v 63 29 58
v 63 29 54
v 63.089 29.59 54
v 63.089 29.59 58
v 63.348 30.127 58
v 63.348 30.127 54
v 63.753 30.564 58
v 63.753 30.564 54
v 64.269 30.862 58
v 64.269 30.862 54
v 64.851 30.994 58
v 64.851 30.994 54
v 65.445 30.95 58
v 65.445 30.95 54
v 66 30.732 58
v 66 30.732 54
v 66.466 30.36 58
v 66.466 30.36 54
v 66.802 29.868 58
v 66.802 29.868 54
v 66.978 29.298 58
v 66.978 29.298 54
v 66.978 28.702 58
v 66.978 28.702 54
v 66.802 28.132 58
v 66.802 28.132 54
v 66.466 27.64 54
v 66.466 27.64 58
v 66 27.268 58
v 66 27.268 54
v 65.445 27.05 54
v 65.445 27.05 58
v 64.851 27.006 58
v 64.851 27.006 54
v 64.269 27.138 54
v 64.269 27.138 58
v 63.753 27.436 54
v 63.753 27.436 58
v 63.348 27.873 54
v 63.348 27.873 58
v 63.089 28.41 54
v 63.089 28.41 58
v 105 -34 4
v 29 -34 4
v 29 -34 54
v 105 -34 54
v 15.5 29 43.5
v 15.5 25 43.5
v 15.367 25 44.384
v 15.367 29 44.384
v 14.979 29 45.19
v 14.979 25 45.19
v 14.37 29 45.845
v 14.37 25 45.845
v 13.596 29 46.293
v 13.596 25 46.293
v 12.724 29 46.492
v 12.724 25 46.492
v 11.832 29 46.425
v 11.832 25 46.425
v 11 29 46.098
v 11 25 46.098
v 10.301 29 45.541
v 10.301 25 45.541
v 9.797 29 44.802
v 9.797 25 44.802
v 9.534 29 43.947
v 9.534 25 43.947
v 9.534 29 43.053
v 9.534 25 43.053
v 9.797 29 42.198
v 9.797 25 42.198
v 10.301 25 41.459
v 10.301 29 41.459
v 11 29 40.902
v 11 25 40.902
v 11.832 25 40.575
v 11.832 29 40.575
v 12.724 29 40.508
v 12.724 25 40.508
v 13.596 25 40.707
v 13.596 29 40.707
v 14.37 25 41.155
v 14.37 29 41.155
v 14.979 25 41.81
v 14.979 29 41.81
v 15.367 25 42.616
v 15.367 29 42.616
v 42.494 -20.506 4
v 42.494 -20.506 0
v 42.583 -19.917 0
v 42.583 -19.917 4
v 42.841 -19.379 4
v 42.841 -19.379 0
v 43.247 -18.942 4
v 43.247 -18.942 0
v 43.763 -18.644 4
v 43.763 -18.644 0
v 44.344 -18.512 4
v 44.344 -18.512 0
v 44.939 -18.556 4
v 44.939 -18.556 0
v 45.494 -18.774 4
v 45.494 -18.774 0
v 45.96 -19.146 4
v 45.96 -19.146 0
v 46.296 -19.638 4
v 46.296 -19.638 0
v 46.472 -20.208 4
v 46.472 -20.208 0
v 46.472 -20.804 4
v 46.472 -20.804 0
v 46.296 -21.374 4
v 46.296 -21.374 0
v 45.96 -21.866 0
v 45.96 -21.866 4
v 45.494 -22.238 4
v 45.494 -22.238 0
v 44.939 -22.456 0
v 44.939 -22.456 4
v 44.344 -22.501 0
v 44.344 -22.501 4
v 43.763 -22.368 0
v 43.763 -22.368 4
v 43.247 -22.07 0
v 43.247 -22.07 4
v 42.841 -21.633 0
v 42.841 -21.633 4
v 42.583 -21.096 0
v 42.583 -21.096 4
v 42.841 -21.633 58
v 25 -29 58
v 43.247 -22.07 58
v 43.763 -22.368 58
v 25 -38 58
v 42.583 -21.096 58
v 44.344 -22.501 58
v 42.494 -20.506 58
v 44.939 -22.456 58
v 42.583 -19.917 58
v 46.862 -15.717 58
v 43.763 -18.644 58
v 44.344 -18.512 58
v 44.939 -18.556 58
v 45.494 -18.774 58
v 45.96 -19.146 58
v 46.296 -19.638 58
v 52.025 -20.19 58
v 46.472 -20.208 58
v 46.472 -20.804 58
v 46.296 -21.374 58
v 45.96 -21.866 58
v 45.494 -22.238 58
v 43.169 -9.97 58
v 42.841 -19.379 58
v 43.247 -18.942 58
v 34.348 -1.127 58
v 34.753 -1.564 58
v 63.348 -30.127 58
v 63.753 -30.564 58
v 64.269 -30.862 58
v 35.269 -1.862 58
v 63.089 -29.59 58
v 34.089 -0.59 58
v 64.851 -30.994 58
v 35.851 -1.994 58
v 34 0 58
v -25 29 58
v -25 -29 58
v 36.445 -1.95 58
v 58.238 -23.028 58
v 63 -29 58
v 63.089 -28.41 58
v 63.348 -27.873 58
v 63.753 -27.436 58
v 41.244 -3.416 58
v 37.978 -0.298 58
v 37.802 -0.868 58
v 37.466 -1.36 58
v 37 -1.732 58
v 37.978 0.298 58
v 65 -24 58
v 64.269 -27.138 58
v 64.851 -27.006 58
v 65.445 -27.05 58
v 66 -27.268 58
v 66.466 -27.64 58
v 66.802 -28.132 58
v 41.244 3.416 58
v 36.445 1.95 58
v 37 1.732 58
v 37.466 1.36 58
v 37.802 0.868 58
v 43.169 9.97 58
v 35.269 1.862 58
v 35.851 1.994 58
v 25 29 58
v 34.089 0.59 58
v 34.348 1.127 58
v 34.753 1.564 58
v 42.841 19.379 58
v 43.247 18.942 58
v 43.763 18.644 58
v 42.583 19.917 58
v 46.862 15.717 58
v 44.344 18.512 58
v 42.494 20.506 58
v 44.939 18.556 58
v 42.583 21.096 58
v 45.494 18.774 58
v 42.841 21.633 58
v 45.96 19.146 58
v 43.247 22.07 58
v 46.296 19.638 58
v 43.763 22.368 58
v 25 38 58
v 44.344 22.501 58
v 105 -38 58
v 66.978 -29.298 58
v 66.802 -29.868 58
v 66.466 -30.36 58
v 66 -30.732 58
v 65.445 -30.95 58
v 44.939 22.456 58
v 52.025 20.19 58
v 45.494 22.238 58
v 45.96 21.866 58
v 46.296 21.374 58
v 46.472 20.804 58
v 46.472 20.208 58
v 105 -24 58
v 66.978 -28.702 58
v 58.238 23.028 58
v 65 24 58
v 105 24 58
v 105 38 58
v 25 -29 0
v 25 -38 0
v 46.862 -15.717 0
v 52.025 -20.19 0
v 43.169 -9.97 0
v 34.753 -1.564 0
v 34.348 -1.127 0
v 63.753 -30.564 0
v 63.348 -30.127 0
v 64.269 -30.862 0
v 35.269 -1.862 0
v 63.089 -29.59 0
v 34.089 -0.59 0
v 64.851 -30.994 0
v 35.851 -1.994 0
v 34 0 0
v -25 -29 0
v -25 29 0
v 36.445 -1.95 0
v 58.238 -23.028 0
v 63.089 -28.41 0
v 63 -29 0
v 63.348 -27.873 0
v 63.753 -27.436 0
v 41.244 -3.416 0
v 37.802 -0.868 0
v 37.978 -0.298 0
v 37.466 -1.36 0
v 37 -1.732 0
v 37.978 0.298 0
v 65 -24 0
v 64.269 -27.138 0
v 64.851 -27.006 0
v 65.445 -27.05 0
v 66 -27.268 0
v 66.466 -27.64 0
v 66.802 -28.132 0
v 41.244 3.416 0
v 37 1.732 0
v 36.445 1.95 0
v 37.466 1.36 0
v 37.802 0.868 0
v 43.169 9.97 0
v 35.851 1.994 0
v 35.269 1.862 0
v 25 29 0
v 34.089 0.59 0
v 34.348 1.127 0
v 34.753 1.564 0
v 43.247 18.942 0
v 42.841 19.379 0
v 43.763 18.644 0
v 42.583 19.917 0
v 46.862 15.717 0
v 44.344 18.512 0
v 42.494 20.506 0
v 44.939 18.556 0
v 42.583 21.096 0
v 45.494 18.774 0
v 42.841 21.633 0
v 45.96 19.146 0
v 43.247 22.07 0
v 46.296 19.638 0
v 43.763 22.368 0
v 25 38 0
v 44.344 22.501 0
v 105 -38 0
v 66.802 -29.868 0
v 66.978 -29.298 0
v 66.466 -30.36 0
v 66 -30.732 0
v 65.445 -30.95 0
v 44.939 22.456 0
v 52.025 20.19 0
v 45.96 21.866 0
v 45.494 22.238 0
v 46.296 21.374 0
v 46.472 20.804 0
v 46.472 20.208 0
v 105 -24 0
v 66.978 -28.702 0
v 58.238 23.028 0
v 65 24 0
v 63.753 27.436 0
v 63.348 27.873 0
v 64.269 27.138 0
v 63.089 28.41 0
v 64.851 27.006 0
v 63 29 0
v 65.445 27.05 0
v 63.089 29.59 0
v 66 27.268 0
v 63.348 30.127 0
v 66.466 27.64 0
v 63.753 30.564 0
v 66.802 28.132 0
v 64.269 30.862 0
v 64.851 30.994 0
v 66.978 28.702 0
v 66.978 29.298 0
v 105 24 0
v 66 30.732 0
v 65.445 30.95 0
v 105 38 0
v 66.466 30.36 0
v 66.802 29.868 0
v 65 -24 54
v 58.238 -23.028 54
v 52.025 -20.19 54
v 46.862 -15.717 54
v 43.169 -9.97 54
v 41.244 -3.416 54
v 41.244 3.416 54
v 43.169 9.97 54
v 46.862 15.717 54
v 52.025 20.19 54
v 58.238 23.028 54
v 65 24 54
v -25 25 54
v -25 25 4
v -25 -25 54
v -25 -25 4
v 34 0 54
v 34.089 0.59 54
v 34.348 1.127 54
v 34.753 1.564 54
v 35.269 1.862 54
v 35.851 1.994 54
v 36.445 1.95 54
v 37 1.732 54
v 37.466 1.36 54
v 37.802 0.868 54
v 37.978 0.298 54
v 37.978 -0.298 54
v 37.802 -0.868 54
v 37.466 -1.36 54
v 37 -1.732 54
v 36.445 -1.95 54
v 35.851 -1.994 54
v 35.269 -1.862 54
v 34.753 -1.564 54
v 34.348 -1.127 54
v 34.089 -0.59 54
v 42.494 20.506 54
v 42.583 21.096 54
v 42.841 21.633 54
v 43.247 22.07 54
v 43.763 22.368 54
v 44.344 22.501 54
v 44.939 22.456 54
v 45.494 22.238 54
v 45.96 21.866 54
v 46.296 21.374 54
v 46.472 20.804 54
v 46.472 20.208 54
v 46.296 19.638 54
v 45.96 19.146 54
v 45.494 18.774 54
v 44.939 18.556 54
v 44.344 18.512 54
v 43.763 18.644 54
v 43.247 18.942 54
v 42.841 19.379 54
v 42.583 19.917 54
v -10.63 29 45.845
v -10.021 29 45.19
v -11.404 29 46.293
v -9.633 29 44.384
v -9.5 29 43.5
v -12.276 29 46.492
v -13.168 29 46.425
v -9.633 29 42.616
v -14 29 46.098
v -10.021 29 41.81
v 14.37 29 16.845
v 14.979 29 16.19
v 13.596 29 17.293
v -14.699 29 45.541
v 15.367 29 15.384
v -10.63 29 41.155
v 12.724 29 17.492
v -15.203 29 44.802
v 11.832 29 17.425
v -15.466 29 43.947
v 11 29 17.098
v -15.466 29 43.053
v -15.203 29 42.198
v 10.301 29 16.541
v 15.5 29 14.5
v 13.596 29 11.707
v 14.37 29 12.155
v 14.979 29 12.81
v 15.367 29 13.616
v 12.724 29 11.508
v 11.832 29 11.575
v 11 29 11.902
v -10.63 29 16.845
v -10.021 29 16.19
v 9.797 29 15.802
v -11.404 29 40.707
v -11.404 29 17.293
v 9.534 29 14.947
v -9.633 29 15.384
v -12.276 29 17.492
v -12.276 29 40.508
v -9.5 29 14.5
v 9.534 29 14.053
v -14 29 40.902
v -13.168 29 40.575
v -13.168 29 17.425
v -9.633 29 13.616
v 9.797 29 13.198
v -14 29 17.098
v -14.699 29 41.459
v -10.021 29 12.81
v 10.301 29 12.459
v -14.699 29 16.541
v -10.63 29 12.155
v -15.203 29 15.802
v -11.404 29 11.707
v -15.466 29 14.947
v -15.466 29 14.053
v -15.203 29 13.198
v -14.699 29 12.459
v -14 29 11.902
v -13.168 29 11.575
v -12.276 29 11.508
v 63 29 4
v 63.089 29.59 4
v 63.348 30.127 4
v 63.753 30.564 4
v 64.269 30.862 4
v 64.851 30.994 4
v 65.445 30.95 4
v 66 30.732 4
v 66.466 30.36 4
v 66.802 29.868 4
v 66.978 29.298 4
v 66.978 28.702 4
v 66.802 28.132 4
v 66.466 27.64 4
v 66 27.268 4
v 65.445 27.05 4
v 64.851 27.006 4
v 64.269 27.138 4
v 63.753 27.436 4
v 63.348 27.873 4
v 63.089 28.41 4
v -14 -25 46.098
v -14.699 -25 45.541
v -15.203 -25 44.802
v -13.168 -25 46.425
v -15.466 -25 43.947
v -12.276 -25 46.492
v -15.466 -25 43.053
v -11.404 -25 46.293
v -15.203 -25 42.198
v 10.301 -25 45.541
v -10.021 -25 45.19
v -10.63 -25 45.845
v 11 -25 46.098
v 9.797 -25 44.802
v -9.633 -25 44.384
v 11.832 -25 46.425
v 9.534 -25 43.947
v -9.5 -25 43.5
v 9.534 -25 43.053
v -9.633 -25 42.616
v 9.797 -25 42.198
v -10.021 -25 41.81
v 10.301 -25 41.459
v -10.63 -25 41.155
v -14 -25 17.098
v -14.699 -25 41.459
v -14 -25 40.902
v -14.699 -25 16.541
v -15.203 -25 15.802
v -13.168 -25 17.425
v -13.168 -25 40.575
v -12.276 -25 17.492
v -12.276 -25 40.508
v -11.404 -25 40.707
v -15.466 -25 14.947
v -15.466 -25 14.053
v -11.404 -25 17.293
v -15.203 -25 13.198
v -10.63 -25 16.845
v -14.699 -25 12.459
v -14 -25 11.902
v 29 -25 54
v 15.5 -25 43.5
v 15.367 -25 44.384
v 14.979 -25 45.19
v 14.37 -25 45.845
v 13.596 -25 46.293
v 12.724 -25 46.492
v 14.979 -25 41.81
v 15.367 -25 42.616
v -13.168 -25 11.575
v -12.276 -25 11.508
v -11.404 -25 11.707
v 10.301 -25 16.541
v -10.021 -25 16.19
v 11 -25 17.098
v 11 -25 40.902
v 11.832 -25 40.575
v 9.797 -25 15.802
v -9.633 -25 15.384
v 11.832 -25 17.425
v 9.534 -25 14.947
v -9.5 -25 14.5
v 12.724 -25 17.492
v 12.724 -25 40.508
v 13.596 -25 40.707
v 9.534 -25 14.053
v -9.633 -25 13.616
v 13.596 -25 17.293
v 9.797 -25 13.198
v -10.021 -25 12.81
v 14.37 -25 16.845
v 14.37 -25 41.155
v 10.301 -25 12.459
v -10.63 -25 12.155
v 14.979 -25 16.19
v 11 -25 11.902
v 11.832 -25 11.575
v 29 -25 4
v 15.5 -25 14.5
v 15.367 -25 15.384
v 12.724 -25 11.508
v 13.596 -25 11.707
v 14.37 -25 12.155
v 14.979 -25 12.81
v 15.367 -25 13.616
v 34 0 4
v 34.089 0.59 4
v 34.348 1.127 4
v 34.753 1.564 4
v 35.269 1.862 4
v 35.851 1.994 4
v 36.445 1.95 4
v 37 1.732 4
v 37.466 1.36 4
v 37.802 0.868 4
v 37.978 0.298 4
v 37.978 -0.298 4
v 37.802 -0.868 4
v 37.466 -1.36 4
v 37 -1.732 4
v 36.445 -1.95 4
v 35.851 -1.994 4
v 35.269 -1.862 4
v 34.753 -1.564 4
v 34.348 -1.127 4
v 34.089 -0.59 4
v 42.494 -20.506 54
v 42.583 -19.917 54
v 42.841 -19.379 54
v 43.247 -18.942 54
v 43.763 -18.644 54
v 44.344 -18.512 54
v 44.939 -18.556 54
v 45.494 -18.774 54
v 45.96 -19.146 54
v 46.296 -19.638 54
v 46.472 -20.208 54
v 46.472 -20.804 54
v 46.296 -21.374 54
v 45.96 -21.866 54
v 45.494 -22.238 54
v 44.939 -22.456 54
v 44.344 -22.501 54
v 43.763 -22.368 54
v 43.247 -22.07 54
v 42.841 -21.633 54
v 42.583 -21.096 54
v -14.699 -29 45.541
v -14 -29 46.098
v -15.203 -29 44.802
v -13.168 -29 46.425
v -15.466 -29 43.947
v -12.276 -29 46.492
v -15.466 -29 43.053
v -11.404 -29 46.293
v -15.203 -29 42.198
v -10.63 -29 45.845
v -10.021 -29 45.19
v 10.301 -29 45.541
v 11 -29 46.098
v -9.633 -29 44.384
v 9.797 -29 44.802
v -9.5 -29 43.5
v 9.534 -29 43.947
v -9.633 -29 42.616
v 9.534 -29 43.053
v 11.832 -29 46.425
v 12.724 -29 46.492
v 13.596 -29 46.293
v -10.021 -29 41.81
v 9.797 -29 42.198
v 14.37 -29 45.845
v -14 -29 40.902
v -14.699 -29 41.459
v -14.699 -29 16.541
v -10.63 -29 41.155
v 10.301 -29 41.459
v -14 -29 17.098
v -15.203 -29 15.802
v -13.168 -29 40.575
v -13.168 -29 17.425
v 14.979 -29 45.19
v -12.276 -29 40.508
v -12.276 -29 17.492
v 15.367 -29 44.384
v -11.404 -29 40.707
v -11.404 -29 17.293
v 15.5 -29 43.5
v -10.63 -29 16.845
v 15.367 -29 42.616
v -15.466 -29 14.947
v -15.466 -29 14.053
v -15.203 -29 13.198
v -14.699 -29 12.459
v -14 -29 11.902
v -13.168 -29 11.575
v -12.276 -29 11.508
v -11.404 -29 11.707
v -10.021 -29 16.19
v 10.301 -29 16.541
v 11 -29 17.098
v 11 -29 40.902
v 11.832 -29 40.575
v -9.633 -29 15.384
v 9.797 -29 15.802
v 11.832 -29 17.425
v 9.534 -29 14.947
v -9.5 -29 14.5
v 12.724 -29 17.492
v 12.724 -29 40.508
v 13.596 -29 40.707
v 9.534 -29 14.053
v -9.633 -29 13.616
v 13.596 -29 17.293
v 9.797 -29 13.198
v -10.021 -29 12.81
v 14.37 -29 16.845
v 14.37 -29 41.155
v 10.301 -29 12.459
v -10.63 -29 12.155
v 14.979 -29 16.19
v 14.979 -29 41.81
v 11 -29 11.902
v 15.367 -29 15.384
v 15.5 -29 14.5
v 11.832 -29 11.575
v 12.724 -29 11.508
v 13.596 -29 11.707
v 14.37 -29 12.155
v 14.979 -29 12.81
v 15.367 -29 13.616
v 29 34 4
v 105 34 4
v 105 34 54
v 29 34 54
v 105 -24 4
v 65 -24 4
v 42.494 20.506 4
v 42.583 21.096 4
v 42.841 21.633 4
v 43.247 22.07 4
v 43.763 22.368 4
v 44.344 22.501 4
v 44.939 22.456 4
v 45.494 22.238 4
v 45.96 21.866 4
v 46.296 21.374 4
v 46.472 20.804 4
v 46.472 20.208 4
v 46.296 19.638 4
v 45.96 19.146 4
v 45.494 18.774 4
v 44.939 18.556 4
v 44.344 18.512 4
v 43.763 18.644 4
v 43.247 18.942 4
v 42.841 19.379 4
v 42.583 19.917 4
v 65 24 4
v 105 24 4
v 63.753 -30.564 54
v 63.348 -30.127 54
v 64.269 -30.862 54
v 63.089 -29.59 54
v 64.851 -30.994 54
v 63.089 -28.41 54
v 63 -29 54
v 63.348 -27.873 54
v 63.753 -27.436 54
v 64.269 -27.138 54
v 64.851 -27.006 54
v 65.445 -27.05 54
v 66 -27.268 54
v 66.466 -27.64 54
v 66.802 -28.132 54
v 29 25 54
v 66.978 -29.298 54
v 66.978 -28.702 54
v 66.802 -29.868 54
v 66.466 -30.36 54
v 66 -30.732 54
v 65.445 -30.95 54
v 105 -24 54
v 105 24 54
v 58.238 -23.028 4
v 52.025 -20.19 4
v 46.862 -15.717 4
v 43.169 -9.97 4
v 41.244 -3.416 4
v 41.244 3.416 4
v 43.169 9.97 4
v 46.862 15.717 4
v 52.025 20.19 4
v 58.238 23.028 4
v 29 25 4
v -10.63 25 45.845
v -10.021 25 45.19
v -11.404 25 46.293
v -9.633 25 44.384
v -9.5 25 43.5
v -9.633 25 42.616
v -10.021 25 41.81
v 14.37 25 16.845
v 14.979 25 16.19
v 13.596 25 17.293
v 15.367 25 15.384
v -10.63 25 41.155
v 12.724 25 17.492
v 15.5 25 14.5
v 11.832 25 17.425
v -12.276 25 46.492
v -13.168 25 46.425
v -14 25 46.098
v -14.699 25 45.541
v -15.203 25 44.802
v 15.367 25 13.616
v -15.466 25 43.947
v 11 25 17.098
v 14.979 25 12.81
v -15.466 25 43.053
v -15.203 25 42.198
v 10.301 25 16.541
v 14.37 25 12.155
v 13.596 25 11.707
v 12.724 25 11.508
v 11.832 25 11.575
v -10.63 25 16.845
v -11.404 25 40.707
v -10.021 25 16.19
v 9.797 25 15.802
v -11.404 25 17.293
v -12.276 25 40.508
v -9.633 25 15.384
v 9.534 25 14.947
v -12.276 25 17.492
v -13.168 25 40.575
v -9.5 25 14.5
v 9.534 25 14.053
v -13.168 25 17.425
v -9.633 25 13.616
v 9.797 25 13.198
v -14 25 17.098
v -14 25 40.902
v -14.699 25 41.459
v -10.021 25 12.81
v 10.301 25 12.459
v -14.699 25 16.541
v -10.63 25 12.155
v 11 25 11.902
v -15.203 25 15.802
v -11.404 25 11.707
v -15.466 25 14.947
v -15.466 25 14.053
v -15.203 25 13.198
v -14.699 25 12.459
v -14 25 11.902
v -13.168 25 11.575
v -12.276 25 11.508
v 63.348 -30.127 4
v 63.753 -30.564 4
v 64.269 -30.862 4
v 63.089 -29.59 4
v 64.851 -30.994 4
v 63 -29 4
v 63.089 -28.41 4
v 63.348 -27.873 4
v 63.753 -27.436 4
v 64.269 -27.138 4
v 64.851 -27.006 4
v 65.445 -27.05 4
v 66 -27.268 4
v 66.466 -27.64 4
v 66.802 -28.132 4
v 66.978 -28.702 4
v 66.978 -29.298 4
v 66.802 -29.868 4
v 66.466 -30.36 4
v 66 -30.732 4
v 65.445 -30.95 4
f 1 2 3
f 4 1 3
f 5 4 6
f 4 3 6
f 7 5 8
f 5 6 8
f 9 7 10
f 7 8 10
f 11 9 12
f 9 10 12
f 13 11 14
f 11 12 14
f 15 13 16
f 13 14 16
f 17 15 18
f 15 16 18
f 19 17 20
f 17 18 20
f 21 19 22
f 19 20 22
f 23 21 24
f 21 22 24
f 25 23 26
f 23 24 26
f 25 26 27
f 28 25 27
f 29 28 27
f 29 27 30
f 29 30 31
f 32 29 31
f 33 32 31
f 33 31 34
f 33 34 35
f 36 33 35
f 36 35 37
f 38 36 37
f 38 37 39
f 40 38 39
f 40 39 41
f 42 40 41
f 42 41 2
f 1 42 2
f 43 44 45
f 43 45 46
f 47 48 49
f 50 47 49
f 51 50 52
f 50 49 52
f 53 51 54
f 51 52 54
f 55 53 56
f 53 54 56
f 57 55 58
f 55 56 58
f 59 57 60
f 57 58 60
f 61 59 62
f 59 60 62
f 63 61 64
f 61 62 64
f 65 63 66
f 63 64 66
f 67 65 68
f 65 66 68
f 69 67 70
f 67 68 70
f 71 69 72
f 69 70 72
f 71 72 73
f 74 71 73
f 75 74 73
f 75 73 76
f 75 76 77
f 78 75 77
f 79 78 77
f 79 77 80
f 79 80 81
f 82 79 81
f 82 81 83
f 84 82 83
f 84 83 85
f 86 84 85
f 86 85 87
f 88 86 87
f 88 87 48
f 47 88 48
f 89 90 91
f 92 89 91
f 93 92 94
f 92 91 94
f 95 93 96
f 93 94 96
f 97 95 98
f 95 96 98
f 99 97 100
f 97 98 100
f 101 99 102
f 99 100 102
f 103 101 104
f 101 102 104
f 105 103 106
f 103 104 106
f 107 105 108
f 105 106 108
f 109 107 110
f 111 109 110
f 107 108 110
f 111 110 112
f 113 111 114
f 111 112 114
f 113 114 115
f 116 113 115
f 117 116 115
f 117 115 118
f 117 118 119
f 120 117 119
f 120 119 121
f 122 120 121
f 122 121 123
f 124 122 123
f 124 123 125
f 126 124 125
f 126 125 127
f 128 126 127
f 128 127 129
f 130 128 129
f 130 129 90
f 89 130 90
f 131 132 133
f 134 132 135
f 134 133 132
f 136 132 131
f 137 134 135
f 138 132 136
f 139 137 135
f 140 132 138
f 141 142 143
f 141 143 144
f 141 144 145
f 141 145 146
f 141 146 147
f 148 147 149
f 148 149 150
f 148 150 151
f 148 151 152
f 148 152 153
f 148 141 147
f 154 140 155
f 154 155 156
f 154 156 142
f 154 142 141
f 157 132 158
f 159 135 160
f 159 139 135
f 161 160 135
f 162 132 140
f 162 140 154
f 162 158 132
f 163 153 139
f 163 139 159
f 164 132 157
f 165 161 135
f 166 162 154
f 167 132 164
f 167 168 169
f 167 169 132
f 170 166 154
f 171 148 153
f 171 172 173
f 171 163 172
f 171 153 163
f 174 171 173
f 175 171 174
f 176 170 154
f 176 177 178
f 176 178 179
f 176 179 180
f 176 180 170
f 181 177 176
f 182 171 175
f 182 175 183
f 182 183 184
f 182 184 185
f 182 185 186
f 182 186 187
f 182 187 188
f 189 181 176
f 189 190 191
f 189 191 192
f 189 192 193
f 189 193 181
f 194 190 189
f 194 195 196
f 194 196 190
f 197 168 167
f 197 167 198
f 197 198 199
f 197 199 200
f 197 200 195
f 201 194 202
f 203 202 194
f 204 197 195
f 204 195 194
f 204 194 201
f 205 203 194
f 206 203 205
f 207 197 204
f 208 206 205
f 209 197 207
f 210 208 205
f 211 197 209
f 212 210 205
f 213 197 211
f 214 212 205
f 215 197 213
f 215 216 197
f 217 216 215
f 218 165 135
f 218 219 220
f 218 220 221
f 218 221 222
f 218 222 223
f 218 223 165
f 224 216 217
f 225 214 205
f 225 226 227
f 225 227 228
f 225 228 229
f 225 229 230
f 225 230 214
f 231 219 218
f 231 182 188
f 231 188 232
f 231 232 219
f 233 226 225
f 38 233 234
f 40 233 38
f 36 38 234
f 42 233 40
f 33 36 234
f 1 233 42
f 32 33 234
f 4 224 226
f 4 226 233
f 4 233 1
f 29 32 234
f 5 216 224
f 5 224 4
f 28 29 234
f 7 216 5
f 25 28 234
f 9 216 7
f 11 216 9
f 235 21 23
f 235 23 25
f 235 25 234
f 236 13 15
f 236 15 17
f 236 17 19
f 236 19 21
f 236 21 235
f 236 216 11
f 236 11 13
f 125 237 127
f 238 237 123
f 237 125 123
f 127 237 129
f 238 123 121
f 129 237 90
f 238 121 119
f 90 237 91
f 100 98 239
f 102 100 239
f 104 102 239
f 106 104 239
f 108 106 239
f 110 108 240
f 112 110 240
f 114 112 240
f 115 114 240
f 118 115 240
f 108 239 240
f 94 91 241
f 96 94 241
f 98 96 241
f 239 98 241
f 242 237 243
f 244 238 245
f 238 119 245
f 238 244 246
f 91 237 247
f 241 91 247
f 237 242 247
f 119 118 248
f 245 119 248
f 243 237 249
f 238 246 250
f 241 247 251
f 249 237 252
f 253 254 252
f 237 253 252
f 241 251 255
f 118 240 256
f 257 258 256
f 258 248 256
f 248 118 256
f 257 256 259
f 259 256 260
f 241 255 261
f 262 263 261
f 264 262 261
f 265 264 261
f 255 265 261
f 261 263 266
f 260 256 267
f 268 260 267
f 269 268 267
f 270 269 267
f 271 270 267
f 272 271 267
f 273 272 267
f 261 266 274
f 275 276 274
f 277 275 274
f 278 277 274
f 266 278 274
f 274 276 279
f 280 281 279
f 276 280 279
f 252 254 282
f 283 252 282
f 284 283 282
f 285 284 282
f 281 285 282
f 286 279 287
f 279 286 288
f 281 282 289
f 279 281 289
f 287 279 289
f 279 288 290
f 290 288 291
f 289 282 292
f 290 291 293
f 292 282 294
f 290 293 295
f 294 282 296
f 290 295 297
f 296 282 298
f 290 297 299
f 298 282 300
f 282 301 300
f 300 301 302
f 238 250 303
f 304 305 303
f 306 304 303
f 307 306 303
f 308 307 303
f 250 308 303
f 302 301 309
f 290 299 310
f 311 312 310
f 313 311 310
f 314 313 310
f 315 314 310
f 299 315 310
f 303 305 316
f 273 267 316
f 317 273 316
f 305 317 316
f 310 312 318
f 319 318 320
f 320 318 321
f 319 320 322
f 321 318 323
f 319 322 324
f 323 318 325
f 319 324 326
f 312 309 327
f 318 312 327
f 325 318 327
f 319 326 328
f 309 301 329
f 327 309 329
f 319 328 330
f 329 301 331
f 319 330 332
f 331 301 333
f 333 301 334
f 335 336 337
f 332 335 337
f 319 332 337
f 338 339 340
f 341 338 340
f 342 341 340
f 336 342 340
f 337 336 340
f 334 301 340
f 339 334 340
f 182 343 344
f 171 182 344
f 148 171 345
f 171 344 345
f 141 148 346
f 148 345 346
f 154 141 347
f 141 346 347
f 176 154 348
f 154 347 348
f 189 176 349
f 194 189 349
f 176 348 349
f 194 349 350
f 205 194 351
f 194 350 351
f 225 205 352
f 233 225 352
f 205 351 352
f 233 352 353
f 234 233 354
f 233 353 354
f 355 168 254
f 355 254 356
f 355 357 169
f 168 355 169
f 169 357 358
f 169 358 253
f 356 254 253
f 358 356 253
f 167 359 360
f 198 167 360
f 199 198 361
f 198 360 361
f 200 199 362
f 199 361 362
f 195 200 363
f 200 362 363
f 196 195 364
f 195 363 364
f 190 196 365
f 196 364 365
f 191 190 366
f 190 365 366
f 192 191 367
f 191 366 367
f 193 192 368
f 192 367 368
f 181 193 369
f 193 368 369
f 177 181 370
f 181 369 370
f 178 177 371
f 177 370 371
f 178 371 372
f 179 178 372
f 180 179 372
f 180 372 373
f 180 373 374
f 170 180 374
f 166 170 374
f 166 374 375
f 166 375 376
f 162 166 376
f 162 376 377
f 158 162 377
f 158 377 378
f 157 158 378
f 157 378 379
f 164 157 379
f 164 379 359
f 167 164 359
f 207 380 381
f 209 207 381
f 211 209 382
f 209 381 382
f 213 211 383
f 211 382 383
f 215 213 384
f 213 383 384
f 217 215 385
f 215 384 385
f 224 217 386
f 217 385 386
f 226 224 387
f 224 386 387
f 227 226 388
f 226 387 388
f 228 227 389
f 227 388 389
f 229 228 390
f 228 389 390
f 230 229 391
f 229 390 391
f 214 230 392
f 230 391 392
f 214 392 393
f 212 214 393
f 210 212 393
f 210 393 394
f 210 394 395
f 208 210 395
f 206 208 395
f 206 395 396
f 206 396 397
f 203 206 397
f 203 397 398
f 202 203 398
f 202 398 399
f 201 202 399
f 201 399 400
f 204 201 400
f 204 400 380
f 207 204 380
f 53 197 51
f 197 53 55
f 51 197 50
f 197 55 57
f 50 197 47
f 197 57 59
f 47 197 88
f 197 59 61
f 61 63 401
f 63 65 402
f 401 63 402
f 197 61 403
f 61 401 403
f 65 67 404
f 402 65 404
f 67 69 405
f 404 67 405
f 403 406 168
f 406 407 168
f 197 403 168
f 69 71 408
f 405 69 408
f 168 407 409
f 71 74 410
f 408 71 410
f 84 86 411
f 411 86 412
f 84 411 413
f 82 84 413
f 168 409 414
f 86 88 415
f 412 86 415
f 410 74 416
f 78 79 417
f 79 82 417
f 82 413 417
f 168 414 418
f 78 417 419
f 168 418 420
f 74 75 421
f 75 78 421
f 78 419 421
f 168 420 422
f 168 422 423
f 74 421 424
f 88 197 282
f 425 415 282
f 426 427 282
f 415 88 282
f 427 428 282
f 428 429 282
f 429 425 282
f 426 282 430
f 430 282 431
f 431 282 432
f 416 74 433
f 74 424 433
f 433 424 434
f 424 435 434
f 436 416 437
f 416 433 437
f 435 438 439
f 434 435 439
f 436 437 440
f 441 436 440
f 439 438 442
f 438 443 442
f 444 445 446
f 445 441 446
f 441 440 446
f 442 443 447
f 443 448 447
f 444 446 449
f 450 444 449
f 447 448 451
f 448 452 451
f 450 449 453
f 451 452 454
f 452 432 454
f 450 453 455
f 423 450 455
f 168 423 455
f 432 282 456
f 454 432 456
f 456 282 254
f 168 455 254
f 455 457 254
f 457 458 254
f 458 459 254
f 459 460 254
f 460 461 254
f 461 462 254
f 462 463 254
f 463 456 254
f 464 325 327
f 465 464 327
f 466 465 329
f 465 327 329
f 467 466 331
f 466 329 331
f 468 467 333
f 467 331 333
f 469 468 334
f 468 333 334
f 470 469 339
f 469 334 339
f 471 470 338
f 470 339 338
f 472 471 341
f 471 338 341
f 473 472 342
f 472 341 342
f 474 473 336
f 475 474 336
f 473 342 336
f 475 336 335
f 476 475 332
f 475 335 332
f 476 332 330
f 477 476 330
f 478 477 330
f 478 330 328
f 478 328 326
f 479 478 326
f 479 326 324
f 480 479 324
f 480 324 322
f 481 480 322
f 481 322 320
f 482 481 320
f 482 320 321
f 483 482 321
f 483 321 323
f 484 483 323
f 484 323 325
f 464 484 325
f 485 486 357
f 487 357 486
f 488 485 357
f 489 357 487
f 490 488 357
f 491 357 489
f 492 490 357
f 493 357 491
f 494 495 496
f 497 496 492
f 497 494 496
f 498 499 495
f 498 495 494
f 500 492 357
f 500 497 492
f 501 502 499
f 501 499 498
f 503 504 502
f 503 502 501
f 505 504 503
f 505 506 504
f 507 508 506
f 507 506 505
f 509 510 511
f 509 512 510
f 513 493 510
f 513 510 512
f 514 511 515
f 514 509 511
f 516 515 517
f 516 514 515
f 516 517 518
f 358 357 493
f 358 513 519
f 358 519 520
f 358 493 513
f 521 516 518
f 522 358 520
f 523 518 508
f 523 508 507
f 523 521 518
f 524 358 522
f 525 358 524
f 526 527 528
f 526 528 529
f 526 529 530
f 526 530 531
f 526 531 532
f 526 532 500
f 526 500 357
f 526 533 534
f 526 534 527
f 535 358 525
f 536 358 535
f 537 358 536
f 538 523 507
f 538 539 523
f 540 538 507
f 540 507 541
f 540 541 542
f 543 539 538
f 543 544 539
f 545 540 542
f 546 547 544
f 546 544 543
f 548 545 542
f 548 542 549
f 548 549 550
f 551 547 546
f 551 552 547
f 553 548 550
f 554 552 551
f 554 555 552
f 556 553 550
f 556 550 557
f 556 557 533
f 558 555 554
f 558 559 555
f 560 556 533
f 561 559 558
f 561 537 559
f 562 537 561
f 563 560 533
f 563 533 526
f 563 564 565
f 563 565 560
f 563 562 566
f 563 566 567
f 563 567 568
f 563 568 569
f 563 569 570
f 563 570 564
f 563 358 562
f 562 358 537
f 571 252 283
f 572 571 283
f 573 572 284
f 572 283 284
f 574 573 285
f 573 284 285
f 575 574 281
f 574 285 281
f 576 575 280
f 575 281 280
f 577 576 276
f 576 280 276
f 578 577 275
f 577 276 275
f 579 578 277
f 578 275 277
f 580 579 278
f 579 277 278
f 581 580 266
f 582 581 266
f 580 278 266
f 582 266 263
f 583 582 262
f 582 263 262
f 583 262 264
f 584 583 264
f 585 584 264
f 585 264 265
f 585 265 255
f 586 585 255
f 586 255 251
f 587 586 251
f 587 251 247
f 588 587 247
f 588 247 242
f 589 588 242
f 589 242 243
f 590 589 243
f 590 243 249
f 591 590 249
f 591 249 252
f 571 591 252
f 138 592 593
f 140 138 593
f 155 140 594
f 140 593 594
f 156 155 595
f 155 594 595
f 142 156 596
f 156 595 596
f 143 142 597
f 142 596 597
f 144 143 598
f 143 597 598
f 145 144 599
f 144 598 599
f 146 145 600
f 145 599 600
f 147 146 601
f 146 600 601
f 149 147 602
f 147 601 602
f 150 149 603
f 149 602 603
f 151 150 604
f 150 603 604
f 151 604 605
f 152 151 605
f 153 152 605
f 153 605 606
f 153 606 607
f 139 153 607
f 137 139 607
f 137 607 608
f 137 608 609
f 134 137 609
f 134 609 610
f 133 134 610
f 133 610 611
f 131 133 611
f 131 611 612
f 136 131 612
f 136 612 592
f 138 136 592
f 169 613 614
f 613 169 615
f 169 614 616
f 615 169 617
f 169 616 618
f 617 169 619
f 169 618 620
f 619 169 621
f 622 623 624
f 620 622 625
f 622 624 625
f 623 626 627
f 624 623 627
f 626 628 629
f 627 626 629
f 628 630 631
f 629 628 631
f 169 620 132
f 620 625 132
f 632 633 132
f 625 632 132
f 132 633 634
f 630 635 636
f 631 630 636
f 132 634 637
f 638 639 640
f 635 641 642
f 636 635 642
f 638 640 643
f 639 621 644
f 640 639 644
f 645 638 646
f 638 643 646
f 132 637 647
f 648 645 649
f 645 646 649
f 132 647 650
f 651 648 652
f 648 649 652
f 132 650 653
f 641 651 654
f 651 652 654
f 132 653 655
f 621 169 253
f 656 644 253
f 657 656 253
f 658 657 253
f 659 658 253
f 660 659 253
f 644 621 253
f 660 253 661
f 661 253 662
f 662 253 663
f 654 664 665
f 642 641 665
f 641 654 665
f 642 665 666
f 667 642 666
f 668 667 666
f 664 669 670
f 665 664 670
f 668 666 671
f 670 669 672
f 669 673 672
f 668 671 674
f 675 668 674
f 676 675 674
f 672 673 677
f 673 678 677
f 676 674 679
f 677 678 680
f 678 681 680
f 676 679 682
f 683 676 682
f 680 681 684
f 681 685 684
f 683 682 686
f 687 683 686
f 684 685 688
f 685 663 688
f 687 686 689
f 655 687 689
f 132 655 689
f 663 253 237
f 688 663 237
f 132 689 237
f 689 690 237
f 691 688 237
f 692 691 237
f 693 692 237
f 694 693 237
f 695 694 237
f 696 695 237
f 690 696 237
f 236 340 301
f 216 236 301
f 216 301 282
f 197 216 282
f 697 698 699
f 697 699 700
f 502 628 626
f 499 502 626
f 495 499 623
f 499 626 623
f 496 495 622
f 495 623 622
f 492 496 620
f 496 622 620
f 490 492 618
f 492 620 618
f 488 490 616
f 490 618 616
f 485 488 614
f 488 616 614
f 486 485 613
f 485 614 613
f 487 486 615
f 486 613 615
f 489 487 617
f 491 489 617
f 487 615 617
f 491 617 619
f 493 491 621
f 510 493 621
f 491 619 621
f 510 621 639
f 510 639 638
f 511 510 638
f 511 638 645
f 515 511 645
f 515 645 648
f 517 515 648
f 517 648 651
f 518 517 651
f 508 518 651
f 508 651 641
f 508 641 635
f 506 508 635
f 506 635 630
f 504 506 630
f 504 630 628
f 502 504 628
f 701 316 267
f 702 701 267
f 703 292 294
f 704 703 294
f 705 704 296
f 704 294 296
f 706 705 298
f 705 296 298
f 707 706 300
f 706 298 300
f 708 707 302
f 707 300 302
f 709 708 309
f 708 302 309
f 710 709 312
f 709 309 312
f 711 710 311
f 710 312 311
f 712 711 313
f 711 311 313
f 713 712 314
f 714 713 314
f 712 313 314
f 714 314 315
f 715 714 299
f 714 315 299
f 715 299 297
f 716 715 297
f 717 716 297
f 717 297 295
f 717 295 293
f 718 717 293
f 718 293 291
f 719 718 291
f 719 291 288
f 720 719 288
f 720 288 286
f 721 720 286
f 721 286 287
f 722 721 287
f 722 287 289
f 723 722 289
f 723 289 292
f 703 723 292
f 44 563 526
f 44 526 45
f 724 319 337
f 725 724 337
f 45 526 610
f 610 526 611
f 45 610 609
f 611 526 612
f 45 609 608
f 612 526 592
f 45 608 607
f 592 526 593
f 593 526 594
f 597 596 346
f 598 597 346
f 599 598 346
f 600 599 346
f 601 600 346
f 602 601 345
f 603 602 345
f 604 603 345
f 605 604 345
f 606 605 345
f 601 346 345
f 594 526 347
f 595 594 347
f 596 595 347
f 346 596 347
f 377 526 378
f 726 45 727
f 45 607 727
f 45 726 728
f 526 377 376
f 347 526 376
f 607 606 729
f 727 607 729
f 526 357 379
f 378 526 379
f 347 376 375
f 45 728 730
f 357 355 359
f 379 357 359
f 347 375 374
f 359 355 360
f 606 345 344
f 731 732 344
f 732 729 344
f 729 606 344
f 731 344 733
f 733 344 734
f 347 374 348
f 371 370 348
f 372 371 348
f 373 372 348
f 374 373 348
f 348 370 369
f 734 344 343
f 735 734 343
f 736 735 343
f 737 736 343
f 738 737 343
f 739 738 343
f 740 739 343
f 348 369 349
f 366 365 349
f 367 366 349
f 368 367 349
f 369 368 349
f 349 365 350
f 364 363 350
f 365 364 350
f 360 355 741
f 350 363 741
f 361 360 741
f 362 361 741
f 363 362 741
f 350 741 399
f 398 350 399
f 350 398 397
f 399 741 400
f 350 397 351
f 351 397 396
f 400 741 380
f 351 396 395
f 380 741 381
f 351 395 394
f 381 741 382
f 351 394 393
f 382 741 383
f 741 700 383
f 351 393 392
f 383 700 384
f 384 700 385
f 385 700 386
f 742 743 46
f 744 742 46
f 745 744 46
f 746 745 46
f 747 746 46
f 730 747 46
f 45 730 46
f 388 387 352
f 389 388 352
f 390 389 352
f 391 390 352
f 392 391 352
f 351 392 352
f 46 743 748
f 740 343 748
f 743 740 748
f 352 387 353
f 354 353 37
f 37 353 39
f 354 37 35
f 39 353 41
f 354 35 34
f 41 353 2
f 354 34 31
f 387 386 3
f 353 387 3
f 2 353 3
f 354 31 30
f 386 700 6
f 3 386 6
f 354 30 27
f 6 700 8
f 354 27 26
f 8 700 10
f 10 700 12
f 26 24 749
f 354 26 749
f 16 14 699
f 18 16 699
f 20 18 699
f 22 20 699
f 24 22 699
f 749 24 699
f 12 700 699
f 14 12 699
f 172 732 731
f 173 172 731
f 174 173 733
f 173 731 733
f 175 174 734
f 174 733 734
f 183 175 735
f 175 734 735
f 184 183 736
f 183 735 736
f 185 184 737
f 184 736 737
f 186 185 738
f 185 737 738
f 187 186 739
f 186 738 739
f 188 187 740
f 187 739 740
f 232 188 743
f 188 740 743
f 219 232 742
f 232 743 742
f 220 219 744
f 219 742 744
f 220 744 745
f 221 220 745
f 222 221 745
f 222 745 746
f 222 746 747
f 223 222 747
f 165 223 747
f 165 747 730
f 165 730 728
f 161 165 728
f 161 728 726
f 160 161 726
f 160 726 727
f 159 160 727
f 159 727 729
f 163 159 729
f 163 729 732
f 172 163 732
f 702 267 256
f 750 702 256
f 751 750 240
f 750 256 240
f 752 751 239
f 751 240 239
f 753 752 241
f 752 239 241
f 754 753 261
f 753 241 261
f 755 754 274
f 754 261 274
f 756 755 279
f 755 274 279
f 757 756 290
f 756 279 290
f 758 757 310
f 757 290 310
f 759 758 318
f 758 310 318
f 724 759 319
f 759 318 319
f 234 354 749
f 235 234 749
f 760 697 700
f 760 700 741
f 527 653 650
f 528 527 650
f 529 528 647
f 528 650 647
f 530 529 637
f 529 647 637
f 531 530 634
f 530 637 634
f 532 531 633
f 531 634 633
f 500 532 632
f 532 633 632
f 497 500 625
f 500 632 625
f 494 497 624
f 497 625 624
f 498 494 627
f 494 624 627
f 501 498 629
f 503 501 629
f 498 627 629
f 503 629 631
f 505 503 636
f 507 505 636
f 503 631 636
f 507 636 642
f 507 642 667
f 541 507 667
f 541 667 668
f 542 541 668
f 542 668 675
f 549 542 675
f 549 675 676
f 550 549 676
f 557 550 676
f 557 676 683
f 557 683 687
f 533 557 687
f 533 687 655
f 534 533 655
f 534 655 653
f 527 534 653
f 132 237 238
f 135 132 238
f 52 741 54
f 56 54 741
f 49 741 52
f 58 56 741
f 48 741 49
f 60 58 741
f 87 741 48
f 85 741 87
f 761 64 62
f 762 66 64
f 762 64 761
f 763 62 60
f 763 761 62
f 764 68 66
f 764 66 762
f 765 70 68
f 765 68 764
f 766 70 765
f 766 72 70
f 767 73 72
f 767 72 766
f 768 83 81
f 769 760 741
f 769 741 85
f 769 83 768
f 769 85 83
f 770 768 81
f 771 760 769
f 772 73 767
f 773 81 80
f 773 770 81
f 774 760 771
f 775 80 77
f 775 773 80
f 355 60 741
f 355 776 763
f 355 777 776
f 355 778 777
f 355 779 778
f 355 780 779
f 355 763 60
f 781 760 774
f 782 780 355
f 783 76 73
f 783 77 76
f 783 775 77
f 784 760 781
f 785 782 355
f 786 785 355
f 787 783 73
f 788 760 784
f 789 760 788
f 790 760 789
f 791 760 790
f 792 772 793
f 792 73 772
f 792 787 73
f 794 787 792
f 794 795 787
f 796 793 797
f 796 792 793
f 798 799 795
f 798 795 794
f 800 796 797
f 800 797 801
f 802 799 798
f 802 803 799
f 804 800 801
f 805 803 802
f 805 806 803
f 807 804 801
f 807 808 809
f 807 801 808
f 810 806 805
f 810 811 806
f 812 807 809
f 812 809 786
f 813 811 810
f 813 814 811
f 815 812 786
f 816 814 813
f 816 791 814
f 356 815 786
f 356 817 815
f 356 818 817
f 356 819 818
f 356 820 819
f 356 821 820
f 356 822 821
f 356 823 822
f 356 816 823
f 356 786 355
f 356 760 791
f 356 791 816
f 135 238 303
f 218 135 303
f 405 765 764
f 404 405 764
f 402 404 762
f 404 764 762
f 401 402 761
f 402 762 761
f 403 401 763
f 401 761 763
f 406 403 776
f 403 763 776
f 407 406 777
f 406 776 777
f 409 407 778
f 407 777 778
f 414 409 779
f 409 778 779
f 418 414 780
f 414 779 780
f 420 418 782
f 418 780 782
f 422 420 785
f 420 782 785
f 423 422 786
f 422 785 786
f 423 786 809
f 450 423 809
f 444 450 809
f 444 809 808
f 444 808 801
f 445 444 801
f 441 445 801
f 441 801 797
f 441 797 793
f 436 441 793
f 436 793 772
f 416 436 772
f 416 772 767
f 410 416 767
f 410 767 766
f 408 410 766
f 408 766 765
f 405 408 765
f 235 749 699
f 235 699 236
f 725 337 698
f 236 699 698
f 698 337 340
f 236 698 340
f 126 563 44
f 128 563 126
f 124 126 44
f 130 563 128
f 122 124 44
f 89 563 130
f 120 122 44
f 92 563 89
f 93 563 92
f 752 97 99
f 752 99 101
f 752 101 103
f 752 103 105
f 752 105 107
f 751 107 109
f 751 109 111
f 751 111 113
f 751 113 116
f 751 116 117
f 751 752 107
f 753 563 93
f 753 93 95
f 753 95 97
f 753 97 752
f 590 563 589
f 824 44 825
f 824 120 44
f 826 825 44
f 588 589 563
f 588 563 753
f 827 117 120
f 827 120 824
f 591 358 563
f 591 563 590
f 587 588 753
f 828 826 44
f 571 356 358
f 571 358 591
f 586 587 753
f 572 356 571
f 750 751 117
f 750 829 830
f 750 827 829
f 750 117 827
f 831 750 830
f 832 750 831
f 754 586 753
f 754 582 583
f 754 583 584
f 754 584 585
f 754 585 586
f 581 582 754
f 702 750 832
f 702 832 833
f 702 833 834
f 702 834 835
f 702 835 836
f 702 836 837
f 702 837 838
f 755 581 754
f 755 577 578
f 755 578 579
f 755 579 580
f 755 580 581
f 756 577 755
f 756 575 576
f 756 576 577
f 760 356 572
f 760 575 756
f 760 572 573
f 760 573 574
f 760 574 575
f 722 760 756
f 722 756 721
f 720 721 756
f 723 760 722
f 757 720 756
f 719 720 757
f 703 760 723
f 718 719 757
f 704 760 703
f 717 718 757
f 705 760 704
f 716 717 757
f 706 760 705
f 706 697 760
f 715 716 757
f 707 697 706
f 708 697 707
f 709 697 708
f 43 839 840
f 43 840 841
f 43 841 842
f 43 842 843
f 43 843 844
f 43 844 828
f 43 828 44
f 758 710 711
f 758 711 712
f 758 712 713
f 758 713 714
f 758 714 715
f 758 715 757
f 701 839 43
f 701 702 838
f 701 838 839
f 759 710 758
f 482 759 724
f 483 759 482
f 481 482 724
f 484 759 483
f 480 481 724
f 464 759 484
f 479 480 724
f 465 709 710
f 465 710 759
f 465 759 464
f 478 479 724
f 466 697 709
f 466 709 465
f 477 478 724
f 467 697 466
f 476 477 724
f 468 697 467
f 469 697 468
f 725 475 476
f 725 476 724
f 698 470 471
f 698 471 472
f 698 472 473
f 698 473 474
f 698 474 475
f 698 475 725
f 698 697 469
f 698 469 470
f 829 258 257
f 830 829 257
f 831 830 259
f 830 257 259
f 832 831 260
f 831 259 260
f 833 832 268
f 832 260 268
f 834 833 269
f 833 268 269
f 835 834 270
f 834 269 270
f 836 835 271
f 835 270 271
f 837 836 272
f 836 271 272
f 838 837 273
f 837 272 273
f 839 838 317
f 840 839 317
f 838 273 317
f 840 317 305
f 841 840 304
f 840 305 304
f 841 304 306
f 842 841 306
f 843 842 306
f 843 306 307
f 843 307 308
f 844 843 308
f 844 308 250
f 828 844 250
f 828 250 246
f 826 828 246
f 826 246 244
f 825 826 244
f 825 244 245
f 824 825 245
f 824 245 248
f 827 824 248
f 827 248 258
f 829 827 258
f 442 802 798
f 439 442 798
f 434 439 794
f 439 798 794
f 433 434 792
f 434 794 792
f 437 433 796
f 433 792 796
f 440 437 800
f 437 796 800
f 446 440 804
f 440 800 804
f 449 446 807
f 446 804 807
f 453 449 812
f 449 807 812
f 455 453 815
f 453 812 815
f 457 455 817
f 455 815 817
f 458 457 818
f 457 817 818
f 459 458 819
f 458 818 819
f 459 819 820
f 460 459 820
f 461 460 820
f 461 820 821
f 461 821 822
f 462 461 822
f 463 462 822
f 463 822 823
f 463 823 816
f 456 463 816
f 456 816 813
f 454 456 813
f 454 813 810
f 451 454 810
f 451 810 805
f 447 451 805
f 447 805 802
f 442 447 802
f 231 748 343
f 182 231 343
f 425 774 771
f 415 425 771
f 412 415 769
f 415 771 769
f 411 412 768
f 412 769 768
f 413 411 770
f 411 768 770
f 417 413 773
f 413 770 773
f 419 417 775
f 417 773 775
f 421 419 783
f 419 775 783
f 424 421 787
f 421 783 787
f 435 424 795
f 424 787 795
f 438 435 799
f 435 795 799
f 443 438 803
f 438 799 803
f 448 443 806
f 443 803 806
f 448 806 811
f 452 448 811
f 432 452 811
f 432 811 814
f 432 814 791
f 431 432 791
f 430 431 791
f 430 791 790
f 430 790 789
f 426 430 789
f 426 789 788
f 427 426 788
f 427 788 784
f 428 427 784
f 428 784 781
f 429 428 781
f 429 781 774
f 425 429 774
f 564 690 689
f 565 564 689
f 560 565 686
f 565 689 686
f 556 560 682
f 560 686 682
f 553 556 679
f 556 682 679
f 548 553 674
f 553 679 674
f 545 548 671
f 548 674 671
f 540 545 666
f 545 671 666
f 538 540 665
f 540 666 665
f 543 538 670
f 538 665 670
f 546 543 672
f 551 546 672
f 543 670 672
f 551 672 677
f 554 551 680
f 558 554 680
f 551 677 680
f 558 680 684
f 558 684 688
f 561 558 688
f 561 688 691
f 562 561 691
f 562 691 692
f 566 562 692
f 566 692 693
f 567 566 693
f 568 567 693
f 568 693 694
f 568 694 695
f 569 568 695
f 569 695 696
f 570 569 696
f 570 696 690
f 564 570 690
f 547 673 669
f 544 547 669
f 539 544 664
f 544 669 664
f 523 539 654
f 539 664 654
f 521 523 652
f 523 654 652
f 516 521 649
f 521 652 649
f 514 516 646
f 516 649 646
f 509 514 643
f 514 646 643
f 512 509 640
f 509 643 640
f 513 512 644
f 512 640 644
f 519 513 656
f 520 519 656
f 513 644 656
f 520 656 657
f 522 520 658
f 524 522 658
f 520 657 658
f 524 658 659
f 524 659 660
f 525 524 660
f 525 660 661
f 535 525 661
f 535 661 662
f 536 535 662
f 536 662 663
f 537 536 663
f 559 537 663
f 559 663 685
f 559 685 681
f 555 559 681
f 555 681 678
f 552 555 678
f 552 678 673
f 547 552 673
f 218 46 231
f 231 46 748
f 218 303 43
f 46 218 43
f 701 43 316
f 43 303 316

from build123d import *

# Parameters (mm, degrees)
BOSS_EXTRUDE1_DEPTH = 58
SHELL1_T            = -4
SKETCH2_R           = 2
CUT_EXTRUDE1_DEPTH  = 60
SKETCH3_R           = 3
CUT_EXTRUDE2_DEPTH  = 70


with BuildPart() as part:
    # Sketch1 → Boss-Extrude1 (new body)
    with BuildSketch(Plane.XY):
        Polygon((-25, -29), (25, -29), (25, -38), (105, -38), (105, 38), (25, 38), (25, 29), (-25, 29), align=None)
    extrude(amount=BOSS_EXTRUDE1_DEPTH)

    # Shell1
    shell1_openings = [part.faces().sort_by_distance(p)[0] for p in [
        (105, 0, 29),
        (-25, 0, 29),
    ]]
    offset(amount=SHELL1_T, openings=shell1_openings, kind=Kind.INTERSECTION)

    # Sketch2 → Cut-Extrude1 (cut)
    with BuildSketch(Plane(origin=(0, 0, 0), x_dir=(-1, 0, 0), z_dir=(0, 0, -1))):
        with Locations((-36, 0)):
            Circle(SKETCH2_R)
        with Locations((-44.493903346, -20.506096654)):
            Circle(SKETCH2_R)
        with Locations((-65, -29)):
            Circle(SKETCH2_R)
        with Locations((-65, 29)):
            Circle(SKETCH2_R)
        with Locations((-44.493903346, 20.506096654)):
            Circle(SKETCH2_R)
        with BuildLine():
            Line((-65, 24), (-105, 24))
            Line((-105, 24), (-105, -24))
            Line((-105, -24), (-65, -24))
            ThreePointArc((-65, -24), (-41, 0), (-65, 24))
        make_face()
    extrude(amount=-CUT_EXTRUDE1_DEPTH, mode=Mode.SUBTRACT)

    # Sketch3 → Cut-Extrude2 (cut)
    with BuildSketch(Plane.XZ.offset(29)):
        with Locations((12.5, 43.5)):
            Circle(SKETCH3_R)
        with Locations((-12.5, 43.5)):
            Circle(SKETCH3_R)
        with Locations((-12.5, 14.5)):
            Circle(SKETCH3_R)
        with Locations((12.5, 14.5)):
            Circle(SKETCH3_R)
    extrude(amount=-CUT_EXTRUDE2_DEPTH, mode=Mode.SUBTRACT)


solid = part.part
